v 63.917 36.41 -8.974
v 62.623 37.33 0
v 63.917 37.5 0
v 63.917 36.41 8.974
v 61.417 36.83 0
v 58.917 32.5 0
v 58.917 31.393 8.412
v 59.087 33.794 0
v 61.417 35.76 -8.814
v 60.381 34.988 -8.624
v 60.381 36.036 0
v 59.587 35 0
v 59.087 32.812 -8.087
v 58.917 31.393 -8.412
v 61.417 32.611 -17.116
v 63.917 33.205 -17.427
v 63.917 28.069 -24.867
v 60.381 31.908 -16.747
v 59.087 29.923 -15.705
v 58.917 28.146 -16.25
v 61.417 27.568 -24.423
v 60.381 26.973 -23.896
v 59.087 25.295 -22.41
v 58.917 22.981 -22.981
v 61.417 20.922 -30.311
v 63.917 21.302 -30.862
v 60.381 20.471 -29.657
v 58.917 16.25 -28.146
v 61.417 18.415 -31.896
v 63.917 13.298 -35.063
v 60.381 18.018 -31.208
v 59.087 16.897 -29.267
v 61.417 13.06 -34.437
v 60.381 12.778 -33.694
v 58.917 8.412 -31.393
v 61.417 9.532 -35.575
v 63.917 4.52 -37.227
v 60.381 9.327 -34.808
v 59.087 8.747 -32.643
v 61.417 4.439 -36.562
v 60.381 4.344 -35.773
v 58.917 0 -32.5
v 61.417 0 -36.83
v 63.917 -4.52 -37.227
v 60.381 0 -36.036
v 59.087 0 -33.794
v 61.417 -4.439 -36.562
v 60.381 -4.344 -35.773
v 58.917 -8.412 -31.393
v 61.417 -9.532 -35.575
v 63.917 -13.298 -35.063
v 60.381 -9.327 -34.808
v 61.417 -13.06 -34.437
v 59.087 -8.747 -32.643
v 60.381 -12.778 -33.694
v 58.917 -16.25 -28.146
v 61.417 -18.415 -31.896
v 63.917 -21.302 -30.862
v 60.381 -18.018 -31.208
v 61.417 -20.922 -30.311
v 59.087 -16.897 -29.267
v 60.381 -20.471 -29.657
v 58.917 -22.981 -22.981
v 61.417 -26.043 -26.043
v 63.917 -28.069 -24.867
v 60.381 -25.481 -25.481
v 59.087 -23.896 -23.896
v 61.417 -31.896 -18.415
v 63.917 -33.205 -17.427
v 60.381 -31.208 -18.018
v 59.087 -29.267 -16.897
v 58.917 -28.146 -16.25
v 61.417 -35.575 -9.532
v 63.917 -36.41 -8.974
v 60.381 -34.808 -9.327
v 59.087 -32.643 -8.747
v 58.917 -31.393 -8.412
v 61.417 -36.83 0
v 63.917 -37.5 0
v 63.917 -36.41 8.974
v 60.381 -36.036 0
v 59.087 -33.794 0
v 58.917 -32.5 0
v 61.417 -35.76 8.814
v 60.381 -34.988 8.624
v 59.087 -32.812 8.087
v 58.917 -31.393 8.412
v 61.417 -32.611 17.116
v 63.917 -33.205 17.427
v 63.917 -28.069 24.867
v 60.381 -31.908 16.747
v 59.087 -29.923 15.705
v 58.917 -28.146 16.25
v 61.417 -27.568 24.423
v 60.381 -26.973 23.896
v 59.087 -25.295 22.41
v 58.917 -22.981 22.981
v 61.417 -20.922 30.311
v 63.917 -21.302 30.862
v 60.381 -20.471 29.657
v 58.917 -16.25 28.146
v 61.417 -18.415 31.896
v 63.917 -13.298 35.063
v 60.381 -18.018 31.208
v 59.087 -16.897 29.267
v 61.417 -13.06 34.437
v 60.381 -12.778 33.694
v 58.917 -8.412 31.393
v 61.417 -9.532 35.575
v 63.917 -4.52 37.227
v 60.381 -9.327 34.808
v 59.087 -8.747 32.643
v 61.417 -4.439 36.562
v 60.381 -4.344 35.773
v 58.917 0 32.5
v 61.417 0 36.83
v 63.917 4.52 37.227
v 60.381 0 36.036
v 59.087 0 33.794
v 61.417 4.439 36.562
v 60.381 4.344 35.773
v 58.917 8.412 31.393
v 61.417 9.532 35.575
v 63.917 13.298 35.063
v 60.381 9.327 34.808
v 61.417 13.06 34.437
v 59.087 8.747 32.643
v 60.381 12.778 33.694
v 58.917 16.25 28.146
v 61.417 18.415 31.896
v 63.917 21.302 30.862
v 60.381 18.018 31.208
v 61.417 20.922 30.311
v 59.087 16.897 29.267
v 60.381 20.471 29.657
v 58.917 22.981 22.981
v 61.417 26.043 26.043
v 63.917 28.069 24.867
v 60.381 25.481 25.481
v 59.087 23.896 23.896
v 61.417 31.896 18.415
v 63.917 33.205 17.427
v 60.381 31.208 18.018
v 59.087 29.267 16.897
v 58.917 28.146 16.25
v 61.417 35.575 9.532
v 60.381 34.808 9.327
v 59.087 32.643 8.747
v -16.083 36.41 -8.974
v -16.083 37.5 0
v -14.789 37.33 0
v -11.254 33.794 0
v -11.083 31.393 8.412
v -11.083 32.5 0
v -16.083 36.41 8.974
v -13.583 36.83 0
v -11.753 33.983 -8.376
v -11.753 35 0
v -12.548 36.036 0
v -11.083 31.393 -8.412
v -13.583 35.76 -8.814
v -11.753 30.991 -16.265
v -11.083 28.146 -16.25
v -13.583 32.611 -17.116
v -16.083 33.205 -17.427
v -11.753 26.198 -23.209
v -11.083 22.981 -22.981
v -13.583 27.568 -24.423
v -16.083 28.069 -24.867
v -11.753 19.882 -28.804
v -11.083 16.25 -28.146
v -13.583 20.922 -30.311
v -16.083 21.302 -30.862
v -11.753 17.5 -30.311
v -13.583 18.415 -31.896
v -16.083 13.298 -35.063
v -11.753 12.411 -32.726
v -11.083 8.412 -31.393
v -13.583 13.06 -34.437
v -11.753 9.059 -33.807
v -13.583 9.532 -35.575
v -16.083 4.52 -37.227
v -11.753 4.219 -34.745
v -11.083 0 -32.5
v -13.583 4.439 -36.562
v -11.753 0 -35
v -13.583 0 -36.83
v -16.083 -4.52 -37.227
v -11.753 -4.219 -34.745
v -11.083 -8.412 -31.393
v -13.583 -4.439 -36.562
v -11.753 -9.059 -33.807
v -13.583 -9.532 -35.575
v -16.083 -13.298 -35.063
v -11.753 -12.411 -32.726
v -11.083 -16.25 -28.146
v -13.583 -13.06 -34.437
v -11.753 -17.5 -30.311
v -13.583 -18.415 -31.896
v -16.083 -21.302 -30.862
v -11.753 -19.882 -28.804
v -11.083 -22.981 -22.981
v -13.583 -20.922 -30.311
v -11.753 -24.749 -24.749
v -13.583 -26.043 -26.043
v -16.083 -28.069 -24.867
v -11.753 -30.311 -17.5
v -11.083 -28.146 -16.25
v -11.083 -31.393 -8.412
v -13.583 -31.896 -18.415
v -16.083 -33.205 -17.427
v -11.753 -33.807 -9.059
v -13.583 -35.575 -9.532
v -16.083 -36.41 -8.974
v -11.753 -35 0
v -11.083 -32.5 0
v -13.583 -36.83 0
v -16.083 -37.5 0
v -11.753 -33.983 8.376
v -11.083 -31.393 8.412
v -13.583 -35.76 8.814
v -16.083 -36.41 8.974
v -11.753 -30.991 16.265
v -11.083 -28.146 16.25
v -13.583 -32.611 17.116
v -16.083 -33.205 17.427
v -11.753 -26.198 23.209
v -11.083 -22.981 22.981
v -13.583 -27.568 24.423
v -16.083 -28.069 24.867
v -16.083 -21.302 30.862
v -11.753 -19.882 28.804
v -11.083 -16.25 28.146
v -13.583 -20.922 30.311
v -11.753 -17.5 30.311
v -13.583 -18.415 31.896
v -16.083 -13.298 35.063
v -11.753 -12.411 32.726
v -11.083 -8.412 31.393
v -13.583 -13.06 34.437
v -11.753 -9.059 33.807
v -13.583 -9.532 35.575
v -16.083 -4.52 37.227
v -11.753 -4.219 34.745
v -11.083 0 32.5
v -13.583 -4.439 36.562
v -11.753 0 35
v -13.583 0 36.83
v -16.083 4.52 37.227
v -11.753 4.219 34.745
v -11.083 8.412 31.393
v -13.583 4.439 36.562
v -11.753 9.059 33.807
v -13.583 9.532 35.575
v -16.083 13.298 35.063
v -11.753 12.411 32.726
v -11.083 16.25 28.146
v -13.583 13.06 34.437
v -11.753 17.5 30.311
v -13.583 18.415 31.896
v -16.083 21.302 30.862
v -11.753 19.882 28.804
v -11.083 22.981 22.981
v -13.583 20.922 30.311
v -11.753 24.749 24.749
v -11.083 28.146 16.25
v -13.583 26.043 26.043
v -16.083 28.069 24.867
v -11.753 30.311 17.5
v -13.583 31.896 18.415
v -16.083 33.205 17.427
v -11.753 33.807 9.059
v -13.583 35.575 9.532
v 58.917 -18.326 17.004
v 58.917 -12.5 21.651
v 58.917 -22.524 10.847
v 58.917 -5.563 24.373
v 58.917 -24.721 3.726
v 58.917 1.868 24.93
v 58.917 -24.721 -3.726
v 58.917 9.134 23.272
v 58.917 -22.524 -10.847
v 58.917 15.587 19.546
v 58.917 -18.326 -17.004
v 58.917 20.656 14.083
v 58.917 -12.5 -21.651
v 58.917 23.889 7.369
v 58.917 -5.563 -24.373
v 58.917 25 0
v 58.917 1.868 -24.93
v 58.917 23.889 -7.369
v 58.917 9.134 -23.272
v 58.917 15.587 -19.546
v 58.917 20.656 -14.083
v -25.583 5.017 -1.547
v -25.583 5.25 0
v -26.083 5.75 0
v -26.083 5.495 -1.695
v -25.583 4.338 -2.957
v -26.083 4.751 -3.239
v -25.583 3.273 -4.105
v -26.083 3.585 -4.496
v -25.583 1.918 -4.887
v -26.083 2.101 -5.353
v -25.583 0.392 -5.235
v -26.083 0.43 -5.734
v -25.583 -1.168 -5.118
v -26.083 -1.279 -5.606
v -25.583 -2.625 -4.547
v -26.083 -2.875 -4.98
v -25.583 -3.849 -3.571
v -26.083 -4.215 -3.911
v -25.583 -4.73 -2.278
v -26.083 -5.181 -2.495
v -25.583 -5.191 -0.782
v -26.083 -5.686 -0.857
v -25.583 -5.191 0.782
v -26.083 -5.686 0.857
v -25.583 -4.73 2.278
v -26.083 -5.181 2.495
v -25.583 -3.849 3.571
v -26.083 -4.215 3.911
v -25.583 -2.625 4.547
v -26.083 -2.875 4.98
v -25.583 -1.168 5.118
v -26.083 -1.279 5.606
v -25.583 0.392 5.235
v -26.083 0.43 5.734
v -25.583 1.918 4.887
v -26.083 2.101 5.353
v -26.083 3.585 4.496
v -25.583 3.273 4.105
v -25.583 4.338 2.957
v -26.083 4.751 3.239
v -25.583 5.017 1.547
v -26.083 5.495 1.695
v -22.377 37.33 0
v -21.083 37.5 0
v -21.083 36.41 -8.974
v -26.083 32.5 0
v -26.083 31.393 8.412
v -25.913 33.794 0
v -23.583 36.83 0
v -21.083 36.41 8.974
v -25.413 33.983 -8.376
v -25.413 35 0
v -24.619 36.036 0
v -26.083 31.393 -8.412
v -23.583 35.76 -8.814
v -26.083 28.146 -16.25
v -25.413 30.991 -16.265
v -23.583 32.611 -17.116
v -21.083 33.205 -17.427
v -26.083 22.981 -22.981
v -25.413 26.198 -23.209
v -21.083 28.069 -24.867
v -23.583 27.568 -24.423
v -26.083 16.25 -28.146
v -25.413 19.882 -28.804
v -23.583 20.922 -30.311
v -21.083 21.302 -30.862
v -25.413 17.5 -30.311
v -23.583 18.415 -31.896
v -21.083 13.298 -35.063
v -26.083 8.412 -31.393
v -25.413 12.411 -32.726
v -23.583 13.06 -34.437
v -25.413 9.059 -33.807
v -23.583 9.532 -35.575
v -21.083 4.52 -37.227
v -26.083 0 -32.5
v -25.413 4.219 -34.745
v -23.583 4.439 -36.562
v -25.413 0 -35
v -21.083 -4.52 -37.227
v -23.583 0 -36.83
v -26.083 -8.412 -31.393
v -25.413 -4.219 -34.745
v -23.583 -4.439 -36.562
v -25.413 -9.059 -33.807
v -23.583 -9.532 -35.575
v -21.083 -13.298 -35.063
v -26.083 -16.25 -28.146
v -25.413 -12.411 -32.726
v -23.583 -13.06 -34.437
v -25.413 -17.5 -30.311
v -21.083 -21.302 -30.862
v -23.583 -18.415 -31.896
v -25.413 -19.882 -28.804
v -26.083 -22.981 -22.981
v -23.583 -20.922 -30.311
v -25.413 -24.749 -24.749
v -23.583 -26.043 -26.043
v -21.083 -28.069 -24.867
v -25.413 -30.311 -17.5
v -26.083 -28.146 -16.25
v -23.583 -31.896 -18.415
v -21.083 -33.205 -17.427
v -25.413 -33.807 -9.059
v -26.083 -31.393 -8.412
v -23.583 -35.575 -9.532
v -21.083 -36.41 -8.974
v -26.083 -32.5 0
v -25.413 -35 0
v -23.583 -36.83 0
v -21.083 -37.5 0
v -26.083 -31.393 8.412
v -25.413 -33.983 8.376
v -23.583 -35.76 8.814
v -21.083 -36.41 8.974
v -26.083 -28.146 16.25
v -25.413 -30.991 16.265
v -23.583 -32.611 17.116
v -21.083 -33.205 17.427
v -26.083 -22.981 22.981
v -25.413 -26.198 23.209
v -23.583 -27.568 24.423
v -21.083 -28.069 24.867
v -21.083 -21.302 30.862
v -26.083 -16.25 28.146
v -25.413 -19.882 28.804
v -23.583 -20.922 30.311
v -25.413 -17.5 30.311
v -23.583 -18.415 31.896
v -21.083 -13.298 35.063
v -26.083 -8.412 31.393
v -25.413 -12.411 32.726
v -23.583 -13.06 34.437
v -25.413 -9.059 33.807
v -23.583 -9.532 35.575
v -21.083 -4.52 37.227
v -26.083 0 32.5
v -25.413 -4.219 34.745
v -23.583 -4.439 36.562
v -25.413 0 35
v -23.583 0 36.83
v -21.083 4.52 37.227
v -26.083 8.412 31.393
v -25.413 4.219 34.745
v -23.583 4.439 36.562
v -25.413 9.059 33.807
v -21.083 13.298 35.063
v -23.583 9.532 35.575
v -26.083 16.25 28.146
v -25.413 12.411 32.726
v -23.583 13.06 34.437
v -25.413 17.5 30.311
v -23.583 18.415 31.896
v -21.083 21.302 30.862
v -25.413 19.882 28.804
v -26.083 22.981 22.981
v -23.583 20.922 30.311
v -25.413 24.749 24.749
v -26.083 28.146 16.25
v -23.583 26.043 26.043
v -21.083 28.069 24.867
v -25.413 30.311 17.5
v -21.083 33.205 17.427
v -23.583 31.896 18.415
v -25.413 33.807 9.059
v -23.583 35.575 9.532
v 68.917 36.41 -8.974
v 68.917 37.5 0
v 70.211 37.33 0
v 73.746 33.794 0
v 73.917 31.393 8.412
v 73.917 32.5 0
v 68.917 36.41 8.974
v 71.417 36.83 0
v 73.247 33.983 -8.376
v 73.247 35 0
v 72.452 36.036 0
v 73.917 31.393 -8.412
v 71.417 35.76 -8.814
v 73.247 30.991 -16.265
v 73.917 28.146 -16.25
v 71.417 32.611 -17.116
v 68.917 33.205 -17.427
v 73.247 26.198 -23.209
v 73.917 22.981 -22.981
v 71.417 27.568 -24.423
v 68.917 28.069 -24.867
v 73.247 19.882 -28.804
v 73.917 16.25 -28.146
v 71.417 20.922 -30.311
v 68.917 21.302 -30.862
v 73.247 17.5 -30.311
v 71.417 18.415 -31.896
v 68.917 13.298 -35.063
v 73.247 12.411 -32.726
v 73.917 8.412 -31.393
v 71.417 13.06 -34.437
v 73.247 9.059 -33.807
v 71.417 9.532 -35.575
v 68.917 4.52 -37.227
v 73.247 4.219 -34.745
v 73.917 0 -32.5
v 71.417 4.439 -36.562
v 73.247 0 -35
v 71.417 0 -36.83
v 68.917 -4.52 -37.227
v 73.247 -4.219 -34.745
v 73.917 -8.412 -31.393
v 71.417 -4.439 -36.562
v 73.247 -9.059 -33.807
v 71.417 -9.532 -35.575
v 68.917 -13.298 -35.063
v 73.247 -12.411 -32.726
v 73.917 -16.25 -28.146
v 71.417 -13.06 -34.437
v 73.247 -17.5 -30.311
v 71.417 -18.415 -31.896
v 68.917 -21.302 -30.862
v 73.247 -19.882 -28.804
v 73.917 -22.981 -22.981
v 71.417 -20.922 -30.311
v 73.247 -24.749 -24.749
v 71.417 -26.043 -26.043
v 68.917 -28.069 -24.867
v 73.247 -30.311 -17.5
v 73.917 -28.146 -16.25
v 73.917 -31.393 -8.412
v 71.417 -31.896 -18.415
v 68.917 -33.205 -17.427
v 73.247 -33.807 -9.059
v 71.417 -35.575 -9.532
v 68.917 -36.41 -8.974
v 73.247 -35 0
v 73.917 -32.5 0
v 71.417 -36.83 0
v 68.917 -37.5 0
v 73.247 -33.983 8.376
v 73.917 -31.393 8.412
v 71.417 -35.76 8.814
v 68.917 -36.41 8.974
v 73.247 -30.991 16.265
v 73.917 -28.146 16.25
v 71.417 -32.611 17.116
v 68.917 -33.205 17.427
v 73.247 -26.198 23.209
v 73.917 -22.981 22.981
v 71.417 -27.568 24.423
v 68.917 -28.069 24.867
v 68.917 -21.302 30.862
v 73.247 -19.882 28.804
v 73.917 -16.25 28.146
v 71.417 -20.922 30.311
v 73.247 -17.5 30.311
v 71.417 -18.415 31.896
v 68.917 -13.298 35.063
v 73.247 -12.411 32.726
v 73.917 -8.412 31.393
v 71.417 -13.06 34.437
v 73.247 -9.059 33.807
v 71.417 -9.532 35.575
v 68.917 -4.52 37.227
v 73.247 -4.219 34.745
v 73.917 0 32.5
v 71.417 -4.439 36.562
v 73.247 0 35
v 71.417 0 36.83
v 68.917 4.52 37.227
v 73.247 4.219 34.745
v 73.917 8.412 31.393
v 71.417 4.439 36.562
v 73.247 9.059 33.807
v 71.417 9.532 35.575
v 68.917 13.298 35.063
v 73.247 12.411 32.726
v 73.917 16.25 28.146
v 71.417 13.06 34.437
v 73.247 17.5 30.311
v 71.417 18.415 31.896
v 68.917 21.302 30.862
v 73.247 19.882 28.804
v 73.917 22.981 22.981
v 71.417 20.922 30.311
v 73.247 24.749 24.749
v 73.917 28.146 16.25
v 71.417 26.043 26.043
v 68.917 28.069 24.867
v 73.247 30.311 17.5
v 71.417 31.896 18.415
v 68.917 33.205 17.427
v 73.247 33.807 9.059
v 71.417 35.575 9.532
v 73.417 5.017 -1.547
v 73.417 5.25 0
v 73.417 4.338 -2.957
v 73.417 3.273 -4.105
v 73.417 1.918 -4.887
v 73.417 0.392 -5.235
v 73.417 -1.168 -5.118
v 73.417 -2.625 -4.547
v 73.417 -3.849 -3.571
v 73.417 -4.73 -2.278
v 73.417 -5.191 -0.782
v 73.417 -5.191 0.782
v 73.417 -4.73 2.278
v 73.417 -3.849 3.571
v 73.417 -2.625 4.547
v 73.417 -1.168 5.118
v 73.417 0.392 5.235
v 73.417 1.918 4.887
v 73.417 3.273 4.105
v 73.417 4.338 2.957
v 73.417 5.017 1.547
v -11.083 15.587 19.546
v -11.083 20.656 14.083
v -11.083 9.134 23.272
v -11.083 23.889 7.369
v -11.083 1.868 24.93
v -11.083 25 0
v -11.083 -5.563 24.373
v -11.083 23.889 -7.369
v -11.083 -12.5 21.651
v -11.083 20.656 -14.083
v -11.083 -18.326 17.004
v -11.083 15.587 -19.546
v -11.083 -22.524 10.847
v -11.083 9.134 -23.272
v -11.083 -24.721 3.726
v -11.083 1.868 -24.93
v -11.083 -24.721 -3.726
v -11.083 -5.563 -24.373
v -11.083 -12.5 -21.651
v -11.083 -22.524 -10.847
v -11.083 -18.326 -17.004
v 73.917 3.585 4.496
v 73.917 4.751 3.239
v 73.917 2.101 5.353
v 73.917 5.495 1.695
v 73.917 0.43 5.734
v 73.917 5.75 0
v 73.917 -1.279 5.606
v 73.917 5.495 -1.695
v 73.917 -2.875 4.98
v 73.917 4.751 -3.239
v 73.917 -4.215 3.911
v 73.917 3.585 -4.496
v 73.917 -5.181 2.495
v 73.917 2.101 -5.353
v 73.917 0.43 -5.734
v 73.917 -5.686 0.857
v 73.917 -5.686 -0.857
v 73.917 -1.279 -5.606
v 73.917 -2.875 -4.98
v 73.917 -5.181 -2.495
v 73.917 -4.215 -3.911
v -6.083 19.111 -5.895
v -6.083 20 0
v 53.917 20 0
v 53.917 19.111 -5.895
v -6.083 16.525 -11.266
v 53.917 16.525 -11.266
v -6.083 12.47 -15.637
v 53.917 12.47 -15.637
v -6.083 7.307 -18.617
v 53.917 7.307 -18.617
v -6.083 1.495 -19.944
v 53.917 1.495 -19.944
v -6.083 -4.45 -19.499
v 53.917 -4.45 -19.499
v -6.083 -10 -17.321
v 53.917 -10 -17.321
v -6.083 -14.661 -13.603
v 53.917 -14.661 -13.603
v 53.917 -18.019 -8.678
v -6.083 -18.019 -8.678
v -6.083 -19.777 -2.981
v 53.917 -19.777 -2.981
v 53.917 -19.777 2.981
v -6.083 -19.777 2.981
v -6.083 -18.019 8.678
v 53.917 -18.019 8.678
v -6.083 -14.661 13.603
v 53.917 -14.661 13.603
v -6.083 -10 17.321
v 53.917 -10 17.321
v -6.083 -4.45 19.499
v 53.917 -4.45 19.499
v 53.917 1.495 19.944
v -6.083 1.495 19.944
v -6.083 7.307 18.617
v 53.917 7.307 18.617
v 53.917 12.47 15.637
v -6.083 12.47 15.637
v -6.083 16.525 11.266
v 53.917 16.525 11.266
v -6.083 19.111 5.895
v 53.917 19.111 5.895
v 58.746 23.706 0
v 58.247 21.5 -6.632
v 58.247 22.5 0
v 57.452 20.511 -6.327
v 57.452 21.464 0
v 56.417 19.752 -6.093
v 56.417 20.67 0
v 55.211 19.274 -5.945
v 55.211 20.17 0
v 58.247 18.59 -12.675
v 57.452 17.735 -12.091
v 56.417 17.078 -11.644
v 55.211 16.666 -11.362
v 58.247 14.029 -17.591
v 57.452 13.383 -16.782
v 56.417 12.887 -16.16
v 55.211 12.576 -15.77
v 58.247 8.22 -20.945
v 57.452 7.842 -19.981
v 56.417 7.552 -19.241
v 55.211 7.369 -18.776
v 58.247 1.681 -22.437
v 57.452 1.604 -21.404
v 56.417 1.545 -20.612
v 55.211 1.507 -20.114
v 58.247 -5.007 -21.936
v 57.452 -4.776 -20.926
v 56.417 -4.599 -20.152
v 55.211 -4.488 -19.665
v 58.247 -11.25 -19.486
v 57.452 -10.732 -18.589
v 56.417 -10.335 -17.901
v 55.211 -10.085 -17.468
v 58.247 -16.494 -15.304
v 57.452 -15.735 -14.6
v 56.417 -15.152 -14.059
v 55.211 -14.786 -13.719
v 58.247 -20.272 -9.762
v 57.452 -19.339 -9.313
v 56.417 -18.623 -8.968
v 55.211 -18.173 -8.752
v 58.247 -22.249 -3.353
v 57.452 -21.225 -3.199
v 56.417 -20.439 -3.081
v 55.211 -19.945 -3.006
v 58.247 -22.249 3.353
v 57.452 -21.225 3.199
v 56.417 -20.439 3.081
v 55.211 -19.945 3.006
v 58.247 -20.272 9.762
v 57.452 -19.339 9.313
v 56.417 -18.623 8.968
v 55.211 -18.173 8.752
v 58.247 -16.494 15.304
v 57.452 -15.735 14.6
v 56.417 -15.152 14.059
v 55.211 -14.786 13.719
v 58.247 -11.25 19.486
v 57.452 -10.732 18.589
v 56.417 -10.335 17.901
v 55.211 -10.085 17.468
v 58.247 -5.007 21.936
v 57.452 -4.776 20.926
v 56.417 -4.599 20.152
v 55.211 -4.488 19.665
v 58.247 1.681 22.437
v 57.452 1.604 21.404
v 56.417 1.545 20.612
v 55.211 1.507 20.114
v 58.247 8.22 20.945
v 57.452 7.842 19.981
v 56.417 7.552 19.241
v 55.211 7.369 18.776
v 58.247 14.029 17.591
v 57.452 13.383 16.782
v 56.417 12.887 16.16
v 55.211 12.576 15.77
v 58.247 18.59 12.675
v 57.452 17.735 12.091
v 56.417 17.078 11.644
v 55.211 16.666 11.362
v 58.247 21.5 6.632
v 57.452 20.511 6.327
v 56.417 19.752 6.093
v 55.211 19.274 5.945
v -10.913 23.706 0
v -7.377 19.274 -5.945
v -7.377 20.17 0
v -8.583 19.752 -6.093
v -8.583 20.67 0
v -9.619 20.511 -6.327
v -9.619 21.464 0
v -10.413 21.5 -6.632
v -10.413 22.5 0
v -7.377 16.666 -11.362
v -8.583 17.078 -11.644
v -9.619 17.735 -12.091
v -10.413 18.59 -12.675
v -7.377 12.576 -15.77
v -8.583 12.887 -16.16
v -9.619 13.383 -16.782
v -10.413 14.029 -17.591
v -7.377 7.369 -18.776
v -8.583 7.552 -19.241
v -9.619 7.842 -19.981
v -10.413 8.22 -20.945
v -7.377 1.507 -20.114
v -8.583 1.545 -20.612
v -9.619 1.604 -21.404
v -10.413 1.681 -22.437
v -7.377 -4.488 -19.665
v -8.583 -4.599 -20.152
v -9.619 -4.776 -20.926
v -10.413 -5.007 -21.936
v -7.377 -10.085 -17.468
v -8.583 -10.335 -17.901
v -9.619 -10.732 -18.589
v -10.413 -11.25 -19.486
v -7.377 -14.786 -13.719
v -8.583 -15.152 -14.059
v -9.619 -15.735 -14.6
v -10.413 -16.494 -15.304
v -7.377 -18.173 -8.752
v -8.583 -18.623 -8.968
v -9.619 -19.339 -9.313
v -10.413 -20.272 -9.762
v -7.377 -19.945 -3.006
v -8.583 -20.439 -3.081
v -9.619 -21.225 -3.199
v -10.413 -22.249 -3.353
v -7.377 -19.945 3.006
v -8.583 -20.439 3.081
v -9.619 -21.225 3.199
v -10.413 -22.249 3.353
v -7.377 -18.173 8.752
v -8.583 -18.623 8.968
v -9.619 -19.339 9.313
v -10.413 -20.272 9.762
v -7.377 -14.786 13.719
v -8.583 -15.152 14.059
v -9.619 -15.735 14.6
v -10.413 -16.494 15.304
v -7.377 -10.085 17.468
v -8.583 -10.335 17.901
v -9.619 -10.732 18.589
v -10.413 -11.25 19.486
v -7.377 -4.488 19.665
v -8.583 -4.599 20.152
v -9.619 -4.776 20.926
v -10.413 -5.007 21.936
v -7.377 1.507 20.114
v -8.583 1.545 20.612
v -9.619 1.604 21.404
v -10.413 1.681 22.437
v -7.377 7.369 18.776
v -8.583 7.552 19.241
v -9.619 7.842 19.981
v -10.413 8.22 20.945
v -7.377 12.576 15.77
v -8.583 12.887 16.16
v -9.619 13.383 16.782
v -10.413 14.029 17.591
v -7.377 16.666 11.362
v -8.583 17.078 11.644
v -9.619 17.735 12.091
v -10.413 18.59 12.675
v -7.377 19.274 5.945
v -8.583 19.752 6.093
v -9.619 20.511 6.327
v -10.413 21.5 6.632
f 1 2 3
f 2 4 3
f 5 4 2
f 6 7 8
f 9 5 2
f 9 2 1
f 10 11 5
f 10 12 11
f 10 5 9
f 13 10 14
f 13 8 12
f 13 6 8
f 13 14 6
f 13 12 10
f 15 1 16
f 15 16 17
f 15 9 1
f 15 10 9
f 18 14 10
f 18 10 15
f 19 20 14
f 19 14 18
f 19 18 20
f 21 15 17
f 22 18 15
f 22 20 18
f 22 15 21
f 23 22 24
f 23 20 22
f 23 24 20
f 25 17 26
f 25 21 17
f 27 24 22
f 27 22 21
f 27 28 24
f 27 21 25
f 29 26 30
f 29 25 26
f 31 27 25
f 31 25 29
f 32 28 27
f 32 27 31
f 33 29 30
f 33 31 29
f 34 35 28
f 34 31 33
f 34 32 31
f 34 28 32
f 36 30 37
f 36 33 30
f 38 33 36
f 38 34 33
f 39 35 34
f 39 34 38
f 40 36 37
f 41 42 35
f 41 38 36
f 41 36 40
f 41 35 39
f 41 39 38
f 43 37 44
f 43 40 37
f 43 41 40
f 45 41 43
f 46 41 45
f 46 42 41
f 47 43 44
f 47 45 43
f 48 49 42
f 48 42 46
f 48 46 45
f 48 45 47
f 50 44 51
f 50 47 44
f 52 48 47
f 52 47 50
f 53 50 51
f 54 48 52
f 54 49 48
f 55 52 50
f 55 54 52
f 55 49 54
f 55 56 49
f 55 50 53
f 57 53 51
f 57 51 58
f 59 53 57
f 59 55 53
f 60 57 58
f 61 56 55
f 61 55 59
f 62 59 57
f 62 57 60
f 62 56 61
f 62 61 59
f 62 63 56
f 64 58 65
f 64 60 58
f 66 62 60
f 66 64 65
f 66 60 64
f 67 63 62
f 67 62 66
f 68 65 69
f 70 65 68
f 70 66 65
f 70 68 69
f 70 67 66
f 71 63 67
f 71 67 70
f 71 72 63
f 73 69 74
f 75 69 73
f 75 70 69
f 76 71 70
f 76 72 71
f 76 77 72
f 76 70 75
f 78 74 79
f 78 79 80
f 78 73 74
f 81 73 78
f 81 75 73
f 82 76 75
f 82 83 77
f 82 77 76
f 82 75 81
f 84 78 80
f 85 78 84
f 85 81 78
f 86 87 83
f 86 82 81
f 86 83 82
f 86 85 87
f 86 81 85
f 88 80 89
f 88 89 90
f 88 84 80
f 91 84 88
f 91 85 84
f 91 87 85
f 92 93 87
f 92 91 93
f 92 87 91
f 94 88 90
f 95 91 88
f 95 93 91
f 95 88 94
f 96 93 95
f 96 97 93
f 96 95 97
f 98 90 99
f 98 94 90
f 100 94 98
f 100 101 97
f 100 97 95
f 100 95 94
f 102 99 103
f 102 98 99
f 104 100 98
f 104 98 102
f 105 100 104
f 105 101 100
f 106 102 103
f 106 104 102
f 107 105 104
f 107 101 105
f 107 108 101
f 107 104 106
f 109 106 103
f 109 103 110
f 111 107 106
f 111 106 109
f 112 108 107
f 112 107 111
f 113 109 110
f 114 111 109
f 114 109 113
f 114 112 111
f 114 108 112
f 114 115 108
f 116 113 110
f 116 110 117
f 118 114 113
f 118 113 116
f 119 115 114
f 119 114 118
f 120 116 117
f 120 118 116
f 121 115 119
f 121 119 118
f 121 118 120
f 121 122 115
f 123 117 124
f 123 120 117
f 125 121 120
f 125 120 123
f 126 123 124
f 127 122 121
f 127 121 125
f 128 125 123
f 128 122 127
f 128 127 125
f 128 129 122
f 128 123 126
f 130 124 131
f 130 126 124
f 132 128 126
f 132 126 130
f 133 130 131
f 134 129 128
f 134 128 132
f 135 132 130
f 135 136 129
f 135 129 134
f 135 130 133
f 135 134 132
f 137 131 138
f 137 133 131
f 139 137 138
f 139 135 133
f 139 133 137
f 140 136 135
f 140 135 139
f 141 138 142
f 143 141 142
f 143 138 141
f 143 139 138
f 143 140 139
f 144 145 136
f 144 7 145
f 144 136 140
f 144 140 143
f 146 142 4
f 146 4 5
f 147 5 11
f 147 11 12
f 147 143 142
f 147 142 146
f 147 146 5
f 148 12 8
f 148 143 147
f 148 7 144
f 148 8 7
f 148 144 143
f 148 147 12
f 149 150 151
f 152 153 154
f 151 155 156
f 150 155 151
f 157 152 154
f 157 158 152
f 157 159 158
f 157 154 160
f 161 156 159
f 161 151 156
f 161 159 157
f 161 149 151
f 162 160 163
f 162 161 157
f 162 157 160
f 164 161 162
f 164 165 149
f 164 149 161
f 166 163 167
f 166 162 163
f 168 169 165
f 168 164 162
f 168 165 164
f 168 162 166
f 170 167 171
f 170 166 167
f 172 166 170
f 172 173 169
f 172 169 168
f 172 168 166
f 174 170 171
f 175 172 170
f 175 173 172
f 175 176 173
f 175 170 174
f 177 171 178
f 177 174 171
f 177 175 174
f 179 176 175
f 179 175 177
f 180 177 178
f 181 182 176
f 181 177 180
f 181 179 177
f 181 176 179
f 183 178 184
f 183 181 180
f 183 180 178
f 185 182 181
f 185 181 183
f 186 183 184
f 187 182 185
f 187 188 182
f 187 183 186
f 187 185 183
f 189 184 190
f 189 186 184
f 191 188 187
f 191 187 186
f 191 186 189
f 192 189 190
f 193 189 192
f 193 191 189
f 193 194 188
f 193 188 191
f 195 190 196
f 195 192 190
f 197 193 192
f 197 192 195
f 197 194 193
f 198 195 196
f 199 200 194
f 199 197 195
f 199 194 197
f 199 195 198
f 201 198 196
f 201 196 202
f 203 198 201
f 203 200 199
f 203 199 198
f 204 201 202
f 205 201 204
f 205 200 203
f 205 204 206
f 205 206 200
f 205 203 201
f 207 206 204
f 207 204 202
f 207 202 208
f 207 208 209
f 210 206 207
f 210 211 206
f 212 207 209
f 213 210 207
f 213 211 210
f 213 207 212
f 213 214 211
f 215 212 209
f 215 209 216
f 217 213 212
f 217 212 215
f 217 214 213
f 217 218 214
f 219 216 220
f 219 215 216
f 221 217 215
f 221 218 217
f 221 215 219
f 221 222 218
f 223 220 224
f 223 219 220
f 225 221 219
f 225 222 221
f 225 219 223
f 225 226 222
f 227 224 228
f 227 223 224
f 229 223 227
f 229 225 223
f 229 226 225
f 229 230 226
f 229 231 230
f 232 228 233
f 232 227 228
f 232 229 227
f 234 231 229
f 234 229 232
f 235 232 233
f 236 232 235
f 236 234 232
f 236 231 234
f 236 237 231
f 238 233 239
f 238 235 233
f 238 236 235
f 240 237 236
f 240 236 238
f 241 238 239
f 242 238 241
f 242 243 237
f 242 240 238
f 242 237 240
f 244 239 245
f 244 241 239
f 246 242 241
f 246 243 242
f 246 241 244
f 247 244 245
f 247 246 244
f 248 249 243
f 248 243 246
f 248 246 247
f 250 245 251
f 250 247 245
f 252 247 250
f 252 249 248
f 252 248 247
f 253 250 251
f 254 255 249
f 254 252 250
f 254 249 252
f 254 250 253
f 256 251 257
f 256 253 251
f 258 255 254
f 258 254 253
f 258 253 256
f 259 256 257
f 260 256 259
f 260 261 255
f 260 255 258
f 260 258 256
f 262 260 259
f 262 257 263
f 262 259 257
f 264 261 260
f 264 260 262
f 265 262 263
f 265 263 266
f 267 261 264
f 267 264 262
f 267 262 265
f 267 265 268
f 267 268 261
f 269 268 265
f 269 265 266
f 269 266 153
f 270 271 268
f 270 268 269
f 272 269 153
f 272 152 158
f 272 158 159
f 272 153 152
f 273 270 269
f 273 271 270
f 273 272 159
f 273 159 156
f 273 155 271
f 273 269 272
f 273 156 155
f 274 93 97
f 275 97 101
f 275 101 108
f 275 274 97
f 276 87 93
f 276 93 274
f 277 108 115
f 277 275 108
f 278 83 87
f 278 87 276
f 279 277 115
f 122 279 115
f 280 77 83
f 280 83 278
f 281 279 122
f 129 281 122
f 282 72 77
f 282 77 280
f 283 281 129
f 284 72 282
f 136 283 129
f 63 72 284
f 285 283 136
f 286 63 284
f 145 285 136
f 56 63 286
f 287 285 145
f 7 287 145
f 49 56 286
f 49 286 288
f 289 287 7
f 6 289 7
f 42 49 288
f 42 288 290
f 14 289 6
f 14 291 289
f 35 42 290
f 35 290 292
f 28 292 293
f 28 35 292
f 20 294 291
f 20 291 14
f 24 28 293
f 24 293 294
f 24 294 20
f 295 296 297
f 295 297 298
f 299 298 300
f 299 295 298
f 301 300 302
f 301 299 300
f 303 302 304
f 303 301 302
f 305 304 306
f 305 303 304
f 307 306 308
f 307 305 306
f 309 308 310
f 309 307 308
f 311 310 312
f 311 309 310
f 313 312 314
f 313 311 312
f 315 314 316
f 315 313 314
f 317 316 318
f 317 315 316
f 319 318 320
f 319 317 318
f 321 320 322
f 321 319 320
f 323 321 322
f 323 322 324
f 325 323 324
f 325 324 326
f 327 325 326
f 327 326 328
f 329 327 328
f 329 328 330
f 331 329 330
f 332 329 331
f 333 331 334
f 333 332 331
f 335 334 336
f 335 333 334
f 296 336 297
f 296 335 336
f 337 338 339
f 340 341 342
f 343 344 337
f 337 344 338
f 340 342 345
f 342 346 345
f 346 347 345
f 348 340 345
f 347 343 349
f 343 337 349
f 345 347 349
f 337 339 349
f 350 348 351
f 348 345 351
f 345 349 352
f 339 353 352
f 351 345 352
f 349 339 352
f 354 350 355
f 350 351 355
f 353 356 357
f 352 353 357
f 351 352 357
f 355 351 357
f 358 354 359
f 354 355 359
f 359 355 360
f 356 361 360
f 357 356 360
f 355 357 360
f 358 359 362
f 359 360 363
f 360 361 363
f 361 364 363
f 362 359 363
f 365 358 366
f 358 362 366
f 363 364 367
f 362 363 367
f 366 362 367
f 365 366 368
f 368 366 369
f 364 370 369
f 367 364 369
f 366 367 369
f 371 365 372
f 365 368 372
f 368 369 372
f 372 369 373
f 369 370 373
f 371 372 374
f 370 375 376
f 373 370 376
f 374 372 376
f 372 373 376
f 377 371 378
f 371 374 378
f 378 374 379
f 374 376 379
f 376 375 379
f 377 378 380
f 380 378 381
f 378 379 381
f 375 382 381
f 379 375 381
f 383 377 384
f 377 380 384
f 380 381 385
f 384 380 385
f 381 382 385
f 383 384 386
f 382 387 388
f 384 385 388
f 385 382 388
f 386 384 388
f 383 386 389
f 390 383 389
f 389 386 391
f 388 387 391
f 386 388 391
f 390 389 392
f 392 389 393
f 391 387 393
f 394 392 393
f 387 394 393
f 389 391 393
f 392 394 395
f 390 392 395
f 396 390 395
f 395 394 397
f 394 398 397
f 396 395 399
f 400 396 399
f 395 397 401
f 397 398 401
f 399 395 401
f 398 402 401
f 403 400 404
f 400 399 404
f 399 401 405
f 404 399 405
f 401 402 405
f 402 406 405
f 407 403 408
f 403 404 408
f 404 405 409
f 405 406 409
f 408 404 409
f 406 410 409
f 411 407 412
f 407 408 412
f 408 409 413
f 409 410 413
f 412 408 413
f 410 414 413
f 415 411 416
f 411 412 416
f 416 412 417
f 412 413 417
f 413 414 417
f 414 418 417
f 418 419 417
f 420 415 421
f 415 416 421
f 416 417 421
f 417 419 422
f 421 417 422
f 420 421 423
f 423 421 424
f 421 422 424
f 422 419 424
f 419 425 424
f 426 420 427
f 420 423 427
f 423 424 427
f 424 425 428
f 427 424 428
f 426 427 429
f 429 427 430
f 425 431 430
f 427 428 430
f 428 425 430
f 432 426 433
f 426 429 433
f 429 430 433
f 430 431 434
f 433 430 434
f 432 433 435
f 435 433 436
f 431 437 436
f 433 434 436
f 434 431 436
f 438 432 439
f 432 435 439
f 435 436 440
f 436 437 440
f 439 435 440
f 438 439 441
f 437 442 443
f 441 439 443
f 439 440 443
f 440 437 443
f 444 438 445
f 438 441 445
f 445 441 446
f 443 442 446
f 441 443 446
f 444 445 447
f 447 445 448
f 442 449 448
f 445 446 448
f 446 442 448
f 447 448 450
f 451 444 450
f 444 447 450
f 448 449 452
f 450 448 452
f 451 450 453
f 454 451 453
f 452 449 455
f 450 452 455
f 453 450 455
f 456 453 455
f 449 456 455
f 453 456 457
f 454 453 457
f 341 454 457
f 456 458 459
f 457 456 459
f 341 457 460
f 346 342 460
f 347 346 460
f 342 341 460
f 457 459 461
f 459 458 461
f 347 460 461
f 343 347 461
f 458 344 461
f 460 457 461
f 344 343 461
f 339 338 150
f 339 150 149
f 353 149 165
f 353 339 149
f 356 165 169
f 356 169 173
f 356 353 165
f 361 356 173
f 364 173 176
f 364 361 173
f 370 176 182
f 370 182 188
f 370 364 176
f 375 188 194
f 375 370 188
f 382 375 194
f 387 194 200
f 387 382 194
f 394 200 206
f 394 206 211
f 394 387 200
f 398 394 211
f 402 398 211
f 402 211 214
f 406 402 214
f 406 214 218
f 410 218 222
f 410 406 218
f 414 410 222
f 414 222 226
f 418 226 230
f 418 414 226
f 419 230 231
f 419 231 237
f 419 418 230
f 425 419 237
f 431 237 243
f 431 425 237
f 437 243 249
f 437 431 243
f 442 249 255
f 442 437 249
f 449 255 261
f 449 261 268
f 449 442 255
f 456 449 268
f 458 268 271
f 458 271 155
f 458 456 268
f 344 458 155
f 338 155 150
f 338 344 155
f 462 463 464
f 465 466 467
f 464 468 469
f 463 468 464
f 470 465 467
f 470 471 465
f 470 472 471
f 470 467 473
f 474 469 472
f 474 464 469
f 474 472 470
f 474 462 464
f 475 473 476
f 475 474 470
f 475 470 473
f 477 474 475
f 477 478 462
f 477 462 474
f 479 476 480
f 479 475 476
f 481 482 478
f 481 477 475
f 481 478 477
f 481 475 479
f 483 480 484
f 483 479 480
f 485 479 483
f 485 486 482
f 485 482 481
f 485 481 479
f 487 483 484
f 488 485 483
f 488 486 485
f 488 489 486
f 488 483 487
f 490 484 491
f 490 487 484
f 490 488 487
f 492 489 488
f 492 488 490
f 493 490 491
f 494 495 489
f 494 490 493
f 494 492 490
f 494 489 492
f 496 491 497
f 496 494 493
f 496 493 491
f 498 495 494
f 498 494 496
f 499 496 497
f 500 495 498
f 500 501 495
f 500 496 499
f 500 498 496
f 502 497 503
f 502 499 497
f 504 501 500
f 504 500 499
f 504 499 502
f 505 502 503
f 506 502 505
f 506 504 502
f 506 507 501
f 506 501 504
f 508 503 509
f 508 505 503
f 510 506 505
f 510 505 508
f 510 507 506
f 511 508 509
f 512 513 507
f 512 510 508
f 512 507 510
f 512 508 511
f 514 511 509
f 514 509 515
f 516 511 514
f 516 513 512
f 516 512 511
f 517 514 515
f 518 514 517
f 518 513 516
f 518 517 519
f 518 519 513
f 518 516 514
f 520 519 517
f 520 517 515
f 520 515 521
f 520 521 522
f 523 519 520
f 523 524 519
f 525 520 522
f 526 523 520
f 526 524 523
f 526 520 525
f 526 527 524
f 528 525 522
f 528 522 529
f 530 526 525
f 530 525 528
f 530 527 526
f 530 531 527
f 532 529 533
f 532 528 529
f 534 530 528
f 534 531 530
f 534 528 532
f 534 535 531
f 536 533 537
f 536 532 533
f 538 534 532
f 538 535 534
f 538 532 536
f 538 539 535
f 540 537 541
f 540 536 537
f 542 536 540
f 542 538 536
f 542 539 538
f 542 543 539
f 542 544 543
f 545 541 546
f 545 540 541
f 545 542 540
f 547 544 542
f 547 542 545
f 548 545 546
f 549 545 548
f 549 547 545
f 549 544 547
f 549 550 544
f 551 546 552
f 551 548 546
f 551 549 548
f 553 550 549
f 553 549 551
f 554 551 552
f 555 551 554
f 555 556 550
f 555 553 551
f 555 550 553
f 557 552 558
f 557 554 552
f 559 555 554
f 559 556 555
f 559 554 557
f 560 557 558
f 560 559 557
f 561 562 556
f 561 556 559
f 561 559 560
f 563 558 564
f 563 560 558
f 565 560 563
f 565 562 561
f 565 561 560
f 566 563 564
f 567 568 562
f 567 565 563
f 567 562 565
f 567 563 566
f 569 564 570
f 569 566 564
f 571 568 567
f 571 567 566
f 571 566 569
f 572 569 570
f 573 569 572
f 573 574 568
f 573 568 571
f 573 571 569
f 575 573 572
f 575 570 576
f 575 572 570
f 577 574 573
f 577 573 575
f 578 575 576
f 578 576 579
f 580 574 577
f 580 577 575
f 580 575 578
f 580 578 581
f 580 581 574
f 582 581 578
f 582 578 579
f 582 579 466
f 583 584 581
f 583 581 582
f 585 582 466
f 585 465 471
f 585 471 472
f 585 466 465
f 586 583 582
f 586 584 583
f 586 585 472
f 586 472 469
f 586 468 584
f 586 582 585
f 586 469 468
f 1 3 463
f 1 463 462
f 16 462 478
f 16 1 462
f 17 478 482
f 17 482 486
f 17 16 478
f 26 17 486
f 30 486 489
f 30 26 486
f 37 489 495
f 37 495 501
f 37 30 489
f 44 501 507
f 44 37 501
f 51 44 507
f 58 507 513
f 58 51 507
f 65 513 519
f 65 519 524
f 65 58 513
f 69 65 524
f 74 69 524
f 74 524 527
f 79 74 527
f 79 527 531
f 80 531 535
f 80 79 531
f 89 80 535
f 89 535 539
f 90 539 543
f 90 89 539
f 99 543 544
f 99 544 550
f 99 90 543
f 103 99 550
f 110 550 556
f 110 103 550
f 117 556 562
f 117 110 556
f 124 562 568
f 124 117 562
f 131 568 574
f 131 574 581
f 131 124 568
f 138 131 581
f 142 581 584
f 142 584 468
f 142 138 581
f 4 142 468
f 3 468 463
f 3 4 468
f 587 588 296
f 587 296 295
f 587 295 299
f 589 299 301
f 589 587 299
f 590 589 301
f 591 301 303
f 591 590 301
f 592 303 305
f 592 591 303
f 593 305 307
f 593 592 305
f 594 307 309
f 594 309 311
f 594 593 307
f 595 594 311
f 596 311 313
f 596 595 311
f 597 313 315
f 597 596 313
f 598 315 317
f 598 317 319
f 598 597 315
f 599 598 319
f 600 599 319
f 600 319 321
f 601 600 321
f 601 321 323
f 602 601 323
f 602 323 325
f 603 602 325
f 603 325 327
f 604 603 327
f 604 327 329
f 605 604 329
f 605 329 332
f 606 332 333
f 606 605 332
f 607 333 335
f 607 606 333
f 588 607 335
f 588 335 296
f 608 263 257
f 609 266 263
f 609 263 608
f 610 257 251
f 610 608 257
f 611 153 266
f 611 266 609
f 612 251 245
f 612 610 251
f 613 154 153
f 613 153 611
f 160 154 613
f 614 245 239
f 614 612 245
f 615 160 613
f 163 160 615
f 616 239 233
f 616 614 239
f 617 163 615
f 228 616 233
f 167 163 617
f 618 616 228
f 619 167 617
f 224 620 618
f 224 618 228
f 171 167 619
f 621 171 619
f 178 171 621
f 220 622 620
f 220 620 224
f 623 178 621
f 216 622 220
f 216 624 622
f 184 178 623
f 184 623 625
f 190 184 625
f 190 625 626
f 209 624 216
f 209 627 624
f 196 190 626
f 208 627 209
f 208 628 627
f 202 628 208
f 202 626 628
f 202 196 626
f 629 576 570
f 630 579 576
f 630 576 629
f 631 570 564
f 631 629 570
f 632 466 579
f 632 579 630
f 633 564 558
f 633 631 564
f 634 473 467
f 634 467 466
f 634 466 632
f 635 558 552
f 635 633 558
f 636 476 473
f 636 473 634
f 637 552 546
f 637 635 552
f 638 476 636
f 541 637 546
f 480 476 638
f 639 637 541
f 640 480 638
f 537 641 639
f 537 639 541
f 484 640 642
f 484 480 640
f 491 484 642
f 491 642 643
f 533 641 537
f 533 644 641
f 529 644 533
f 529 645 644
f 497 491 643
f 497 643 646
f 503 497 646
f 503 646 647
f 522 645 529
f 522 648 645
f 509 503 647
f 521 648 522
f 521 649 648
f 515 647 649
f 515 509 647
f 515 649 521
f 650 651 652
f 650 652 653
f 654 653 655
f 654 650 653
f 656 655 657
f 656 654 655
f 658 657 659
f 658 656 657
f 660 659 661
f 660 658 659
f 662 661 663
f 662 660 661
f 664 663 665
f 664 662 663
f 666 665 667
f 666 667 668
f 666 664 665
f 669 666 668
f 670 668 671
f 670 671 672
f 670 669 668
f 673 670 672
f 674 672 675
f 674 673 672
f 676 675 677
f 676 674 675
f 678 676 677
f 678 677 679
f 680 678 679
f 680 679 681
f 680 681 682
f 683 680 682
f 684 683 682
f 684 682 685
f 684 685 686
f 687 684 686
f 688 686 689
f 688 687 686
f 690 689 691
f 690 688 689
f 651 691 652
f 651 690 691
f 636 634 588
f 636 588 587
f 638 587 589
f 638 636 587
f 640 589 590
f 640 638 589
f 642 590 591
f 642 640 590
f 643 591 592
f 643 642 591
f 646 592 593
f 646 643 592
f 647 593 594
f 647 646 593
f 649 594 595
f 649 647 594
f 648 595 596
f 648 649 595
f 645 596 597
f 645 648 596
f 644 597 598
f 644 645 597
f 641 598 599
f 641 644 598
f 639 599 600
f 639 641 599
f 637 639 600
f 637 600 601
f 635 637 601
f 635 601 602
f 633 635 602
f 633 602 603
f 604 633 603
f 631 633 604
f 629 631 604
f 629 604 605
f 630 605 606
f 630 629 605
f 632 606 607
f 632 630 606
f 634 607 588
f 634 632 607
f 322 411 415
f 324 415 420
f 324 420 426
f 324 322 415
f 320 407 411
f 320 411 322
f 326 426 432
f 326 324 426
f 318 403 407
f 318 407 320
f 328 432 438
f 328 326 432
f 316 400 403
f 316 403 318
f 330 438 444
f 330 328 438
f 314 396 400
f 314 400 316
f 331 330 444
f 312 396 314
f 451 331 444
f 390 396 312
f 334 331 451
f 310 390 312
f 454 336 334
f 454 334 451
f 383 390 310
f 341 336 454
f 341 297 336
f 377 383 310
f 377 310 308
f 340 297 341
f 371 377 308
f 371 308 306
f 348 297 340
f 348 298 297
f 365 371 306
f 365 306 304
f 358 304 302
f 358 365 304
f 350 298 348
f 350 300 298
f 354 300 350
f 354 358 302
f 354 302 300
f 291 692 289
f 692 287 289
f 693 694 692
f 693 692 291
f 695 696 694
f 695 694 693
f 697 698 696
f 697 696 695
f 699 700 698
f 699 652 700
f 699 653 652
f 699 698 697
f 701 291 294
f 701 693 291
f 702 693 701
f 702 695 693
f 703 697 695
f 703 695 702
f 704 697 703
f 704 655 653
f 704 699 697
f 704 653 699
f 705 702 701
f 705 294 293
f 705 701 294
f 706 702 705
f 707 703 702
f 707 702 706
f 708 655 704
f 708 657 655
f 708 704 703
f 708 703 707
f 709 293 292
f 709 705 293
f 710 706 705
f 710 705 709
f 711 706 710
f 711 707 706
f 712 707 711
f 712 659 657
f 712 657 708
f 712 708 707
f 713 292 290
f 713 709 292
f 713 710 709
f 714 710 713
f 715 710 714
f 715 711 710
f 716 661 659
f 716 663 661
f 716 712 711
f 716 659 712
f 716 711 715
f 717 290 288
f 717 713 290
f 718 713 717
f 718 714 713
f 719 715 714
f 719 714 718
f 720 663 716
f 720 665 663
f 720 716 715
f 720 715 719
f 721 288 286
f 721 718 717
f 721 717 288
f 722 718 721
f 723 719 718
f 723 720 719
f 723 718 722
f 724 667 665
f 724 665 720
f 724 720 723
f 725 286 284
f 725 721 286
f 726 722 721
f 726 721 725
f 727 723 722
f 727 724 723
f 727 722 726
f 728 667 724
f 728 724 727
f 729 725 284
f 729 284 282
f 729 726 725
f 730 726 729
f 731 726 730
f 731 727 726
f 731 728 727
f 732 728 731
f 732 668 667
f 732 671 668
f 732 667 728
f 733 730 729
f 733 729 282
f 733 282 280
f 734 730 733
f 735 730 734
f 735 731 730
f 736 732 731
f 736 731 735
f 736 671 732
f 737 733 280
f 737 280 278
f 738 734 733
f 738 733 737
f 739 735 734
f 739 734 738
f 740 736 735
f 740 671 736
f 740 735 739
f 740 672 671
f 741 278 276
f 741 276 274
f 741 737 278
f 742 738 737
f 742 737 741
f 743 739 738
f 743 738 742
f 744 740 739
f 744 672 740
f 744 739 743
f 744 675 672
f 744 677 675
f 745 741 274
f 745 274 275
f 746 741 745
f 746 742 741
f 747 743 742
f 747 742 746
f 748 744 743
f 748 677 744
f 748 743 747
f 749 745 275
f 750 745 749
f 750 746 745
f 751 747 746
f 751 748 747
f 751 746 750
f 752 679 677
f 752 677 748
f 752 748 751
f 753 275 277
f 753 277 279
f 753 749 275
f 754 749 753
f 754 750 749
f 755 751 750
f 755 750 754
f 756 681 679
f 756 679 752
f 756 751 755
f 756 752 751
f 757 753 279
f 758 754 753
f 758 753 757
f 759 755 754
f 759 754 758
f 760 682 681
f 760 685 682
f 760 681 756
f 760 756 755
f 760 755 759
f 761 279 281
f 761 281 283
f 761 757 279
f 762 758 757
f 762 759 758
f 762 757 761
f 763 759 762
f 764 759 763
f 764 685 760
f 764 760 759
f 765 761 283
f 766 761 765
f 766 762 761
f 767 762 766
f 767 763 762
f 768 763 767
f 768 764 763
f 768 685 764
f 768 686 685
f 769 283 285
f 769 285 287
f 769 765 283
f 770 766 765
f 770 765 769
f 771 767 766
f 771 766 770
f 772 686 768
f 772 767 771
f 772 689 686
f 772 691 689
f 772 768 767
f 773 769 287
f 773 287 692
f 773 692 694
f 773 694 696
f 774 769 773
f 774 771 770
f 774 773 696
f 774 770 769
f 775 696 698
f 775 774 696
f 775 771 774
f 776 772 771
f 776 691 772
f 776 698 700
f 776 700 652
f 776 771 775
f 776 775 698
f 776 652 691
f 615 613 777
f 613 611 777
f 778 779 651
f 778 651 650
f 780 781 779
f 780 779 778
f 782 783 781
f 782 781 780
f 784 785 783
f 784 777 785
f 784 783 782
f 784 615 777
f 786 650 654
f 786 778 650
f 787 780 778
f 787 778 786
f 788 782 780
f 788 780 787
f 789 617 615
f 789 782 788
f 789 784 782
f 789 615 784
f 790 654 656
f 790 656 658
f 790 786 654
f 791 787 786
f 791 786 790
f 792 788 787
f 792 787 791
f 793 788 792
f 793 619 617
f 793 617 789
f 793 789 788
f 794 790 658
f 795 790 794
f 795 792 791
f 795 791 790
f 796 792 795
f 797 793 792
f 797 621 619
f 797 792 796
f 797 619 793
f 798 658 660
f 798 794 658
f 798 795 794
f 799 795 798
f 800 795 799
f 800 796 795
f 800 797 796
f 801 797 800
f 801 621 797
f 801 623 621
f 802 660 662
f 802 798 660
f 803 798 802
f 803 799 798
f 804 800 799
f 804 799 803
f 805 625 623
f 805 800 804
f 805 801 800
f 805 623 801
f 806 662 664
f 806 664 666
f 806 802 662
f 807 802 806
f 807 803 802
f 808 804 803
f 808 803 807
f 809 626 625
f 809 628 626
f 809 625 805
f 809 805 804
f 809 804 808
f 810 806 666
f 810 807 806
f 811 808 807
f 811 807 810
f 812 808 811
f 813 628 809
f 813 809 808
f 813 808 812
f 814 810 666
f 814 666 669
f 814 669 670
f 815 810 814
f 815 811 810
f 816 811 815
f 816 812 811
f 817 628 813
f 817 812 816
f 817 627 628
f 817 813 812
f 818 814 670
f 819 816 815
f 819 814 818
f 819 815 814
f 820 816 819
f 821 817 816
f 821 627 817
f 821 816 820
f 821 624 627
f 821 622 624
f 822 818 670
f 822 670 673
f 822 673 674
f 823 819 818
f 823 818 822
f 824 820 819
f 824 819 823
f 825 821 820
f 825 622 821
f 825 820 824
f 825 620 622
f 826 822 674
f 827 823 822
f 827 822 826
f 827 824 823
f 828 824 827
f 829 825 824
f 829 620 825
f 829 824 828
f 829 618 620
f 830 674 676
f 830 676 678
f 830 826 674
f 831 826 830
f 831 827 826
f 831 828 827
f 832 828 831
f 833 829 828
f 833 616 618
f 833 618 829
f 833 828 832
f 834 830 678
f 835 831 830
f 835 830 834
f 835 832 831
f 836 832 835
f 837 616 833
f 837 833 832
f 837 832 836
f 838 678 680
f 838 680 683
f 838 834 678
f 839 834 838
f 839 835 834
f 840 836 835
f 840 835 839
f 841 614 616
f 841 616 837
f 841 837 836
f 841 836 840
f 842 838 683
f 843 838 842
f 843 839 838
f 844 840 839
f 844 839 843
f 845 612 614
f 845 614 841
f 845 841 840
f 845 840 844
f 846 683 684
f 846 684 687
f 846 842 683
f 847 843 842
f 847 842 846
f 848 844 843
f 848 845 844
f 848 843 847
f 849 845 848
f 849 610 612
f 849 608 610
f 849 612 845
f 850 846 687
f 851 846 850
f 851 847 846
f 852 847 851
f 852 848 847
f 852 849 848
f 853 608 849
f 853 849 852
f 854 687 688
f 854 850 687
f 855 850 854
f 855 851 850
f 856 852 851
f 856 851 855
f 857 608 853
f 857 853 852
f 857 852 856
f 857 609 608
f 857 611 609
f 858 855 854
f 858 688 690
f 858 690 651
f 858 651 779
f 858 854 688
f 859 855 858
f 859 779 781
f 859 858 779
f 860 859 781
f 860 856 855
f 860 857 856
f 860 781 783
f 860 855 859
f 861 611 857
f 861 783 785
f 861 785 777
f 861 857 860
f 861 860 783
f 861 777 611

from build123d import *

# Parameters (mm, degrees)
F2_R    = 5
F3_SIZE = 0.5


with BuildPart() as f1:
    # F0 (on Top) → F1 (revolve)
    with BuildSketch(Plane.XY):
        Polygon((-26.083331, 37.5), (-26.083331, 5.25), (73.916669, 5.25), (73.916669, 37.5), (58.916669, 37.5), (58.916669, 20), (-11.083331, 20), (-11.083331, 37.5), align=None)
    revolve(axis=Axis((-3.25, 0, 0), (-1, 0, 0)))

    # F2
    f2_edges = [f1.edges().sort_by_distance(p)[0] for p in [
        (-26.083331, -37.5, 0),
        (-11.083331, -37.5, 0),
        (58.916669, -37.5, 0),
        (73.916669, -37.5, 0),
        (58.916669, -20, 0),
        (-11.083331, -20, 0),
        (23.916669, 20, 0),
    ]]
    fillet(f2_edges, radius=F2_R)

    # F3
    f3_edges = [f1.edges().sort_by_distance(p)[0] for p in [
        (73.916669, -5.25, 0),
        (-26.083331, -5.25, 0),
    ]]
    chamfer(f3_edges, length=F3_SIZE)


solid = f1.part
